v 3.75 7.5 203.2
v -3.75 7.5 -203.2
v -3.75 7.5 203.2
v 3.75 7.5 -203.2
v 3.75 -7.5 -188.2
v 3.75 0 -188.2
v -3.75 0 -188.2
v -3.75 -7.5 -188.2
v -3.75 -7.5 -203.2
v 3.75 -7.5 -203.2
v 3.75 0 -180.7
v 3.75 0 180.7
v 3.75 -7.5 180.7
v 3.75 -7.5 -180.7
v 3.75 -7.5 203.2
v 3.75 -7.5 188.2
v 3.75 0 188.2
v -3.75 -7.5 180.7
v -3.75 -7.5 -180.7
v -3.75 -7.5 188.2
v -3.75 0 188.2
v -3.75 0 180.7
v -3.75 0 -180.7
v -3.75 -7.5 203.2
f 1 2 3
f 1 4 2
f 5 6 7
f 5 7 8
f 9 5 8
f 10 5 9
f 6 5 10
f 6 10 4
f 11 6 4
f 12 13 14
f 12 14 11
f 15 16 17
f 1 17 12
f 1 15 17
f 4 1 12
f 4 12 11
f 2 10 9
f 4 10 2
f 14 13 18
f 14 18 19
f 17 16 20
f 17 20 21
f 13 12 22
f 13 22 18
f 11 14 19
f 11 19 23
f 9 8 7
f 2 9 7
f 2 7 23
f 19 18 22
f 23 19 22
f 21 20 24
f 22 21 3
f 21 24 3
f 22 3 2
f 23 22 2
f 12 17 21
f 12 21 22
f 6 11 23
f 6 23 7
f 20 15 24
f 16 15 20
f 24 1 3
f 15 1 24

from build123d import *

# Parameters (mm, degrees)
F1_DEPTH = 3.75


with BuildPart() as f1:
    # F0 (on Right) → F1 (new body, symmetric)
    with BuildSketch(Plane.YZ):
        Polygon((7.5, -203.2), (7.5, 203.2), (-7.5, 203.2), (-7.5, 188.2), (0, 188.2), (0, 180.7), (-7.5, 180.7), (-7.5, -180.7), (0, -180.7), (0, -188.2), (-7.5, -188.2), (-7.5, -203.2), align=None)
    extrude(amount=F1_DEPTH, both=True)


solid = f1.part
